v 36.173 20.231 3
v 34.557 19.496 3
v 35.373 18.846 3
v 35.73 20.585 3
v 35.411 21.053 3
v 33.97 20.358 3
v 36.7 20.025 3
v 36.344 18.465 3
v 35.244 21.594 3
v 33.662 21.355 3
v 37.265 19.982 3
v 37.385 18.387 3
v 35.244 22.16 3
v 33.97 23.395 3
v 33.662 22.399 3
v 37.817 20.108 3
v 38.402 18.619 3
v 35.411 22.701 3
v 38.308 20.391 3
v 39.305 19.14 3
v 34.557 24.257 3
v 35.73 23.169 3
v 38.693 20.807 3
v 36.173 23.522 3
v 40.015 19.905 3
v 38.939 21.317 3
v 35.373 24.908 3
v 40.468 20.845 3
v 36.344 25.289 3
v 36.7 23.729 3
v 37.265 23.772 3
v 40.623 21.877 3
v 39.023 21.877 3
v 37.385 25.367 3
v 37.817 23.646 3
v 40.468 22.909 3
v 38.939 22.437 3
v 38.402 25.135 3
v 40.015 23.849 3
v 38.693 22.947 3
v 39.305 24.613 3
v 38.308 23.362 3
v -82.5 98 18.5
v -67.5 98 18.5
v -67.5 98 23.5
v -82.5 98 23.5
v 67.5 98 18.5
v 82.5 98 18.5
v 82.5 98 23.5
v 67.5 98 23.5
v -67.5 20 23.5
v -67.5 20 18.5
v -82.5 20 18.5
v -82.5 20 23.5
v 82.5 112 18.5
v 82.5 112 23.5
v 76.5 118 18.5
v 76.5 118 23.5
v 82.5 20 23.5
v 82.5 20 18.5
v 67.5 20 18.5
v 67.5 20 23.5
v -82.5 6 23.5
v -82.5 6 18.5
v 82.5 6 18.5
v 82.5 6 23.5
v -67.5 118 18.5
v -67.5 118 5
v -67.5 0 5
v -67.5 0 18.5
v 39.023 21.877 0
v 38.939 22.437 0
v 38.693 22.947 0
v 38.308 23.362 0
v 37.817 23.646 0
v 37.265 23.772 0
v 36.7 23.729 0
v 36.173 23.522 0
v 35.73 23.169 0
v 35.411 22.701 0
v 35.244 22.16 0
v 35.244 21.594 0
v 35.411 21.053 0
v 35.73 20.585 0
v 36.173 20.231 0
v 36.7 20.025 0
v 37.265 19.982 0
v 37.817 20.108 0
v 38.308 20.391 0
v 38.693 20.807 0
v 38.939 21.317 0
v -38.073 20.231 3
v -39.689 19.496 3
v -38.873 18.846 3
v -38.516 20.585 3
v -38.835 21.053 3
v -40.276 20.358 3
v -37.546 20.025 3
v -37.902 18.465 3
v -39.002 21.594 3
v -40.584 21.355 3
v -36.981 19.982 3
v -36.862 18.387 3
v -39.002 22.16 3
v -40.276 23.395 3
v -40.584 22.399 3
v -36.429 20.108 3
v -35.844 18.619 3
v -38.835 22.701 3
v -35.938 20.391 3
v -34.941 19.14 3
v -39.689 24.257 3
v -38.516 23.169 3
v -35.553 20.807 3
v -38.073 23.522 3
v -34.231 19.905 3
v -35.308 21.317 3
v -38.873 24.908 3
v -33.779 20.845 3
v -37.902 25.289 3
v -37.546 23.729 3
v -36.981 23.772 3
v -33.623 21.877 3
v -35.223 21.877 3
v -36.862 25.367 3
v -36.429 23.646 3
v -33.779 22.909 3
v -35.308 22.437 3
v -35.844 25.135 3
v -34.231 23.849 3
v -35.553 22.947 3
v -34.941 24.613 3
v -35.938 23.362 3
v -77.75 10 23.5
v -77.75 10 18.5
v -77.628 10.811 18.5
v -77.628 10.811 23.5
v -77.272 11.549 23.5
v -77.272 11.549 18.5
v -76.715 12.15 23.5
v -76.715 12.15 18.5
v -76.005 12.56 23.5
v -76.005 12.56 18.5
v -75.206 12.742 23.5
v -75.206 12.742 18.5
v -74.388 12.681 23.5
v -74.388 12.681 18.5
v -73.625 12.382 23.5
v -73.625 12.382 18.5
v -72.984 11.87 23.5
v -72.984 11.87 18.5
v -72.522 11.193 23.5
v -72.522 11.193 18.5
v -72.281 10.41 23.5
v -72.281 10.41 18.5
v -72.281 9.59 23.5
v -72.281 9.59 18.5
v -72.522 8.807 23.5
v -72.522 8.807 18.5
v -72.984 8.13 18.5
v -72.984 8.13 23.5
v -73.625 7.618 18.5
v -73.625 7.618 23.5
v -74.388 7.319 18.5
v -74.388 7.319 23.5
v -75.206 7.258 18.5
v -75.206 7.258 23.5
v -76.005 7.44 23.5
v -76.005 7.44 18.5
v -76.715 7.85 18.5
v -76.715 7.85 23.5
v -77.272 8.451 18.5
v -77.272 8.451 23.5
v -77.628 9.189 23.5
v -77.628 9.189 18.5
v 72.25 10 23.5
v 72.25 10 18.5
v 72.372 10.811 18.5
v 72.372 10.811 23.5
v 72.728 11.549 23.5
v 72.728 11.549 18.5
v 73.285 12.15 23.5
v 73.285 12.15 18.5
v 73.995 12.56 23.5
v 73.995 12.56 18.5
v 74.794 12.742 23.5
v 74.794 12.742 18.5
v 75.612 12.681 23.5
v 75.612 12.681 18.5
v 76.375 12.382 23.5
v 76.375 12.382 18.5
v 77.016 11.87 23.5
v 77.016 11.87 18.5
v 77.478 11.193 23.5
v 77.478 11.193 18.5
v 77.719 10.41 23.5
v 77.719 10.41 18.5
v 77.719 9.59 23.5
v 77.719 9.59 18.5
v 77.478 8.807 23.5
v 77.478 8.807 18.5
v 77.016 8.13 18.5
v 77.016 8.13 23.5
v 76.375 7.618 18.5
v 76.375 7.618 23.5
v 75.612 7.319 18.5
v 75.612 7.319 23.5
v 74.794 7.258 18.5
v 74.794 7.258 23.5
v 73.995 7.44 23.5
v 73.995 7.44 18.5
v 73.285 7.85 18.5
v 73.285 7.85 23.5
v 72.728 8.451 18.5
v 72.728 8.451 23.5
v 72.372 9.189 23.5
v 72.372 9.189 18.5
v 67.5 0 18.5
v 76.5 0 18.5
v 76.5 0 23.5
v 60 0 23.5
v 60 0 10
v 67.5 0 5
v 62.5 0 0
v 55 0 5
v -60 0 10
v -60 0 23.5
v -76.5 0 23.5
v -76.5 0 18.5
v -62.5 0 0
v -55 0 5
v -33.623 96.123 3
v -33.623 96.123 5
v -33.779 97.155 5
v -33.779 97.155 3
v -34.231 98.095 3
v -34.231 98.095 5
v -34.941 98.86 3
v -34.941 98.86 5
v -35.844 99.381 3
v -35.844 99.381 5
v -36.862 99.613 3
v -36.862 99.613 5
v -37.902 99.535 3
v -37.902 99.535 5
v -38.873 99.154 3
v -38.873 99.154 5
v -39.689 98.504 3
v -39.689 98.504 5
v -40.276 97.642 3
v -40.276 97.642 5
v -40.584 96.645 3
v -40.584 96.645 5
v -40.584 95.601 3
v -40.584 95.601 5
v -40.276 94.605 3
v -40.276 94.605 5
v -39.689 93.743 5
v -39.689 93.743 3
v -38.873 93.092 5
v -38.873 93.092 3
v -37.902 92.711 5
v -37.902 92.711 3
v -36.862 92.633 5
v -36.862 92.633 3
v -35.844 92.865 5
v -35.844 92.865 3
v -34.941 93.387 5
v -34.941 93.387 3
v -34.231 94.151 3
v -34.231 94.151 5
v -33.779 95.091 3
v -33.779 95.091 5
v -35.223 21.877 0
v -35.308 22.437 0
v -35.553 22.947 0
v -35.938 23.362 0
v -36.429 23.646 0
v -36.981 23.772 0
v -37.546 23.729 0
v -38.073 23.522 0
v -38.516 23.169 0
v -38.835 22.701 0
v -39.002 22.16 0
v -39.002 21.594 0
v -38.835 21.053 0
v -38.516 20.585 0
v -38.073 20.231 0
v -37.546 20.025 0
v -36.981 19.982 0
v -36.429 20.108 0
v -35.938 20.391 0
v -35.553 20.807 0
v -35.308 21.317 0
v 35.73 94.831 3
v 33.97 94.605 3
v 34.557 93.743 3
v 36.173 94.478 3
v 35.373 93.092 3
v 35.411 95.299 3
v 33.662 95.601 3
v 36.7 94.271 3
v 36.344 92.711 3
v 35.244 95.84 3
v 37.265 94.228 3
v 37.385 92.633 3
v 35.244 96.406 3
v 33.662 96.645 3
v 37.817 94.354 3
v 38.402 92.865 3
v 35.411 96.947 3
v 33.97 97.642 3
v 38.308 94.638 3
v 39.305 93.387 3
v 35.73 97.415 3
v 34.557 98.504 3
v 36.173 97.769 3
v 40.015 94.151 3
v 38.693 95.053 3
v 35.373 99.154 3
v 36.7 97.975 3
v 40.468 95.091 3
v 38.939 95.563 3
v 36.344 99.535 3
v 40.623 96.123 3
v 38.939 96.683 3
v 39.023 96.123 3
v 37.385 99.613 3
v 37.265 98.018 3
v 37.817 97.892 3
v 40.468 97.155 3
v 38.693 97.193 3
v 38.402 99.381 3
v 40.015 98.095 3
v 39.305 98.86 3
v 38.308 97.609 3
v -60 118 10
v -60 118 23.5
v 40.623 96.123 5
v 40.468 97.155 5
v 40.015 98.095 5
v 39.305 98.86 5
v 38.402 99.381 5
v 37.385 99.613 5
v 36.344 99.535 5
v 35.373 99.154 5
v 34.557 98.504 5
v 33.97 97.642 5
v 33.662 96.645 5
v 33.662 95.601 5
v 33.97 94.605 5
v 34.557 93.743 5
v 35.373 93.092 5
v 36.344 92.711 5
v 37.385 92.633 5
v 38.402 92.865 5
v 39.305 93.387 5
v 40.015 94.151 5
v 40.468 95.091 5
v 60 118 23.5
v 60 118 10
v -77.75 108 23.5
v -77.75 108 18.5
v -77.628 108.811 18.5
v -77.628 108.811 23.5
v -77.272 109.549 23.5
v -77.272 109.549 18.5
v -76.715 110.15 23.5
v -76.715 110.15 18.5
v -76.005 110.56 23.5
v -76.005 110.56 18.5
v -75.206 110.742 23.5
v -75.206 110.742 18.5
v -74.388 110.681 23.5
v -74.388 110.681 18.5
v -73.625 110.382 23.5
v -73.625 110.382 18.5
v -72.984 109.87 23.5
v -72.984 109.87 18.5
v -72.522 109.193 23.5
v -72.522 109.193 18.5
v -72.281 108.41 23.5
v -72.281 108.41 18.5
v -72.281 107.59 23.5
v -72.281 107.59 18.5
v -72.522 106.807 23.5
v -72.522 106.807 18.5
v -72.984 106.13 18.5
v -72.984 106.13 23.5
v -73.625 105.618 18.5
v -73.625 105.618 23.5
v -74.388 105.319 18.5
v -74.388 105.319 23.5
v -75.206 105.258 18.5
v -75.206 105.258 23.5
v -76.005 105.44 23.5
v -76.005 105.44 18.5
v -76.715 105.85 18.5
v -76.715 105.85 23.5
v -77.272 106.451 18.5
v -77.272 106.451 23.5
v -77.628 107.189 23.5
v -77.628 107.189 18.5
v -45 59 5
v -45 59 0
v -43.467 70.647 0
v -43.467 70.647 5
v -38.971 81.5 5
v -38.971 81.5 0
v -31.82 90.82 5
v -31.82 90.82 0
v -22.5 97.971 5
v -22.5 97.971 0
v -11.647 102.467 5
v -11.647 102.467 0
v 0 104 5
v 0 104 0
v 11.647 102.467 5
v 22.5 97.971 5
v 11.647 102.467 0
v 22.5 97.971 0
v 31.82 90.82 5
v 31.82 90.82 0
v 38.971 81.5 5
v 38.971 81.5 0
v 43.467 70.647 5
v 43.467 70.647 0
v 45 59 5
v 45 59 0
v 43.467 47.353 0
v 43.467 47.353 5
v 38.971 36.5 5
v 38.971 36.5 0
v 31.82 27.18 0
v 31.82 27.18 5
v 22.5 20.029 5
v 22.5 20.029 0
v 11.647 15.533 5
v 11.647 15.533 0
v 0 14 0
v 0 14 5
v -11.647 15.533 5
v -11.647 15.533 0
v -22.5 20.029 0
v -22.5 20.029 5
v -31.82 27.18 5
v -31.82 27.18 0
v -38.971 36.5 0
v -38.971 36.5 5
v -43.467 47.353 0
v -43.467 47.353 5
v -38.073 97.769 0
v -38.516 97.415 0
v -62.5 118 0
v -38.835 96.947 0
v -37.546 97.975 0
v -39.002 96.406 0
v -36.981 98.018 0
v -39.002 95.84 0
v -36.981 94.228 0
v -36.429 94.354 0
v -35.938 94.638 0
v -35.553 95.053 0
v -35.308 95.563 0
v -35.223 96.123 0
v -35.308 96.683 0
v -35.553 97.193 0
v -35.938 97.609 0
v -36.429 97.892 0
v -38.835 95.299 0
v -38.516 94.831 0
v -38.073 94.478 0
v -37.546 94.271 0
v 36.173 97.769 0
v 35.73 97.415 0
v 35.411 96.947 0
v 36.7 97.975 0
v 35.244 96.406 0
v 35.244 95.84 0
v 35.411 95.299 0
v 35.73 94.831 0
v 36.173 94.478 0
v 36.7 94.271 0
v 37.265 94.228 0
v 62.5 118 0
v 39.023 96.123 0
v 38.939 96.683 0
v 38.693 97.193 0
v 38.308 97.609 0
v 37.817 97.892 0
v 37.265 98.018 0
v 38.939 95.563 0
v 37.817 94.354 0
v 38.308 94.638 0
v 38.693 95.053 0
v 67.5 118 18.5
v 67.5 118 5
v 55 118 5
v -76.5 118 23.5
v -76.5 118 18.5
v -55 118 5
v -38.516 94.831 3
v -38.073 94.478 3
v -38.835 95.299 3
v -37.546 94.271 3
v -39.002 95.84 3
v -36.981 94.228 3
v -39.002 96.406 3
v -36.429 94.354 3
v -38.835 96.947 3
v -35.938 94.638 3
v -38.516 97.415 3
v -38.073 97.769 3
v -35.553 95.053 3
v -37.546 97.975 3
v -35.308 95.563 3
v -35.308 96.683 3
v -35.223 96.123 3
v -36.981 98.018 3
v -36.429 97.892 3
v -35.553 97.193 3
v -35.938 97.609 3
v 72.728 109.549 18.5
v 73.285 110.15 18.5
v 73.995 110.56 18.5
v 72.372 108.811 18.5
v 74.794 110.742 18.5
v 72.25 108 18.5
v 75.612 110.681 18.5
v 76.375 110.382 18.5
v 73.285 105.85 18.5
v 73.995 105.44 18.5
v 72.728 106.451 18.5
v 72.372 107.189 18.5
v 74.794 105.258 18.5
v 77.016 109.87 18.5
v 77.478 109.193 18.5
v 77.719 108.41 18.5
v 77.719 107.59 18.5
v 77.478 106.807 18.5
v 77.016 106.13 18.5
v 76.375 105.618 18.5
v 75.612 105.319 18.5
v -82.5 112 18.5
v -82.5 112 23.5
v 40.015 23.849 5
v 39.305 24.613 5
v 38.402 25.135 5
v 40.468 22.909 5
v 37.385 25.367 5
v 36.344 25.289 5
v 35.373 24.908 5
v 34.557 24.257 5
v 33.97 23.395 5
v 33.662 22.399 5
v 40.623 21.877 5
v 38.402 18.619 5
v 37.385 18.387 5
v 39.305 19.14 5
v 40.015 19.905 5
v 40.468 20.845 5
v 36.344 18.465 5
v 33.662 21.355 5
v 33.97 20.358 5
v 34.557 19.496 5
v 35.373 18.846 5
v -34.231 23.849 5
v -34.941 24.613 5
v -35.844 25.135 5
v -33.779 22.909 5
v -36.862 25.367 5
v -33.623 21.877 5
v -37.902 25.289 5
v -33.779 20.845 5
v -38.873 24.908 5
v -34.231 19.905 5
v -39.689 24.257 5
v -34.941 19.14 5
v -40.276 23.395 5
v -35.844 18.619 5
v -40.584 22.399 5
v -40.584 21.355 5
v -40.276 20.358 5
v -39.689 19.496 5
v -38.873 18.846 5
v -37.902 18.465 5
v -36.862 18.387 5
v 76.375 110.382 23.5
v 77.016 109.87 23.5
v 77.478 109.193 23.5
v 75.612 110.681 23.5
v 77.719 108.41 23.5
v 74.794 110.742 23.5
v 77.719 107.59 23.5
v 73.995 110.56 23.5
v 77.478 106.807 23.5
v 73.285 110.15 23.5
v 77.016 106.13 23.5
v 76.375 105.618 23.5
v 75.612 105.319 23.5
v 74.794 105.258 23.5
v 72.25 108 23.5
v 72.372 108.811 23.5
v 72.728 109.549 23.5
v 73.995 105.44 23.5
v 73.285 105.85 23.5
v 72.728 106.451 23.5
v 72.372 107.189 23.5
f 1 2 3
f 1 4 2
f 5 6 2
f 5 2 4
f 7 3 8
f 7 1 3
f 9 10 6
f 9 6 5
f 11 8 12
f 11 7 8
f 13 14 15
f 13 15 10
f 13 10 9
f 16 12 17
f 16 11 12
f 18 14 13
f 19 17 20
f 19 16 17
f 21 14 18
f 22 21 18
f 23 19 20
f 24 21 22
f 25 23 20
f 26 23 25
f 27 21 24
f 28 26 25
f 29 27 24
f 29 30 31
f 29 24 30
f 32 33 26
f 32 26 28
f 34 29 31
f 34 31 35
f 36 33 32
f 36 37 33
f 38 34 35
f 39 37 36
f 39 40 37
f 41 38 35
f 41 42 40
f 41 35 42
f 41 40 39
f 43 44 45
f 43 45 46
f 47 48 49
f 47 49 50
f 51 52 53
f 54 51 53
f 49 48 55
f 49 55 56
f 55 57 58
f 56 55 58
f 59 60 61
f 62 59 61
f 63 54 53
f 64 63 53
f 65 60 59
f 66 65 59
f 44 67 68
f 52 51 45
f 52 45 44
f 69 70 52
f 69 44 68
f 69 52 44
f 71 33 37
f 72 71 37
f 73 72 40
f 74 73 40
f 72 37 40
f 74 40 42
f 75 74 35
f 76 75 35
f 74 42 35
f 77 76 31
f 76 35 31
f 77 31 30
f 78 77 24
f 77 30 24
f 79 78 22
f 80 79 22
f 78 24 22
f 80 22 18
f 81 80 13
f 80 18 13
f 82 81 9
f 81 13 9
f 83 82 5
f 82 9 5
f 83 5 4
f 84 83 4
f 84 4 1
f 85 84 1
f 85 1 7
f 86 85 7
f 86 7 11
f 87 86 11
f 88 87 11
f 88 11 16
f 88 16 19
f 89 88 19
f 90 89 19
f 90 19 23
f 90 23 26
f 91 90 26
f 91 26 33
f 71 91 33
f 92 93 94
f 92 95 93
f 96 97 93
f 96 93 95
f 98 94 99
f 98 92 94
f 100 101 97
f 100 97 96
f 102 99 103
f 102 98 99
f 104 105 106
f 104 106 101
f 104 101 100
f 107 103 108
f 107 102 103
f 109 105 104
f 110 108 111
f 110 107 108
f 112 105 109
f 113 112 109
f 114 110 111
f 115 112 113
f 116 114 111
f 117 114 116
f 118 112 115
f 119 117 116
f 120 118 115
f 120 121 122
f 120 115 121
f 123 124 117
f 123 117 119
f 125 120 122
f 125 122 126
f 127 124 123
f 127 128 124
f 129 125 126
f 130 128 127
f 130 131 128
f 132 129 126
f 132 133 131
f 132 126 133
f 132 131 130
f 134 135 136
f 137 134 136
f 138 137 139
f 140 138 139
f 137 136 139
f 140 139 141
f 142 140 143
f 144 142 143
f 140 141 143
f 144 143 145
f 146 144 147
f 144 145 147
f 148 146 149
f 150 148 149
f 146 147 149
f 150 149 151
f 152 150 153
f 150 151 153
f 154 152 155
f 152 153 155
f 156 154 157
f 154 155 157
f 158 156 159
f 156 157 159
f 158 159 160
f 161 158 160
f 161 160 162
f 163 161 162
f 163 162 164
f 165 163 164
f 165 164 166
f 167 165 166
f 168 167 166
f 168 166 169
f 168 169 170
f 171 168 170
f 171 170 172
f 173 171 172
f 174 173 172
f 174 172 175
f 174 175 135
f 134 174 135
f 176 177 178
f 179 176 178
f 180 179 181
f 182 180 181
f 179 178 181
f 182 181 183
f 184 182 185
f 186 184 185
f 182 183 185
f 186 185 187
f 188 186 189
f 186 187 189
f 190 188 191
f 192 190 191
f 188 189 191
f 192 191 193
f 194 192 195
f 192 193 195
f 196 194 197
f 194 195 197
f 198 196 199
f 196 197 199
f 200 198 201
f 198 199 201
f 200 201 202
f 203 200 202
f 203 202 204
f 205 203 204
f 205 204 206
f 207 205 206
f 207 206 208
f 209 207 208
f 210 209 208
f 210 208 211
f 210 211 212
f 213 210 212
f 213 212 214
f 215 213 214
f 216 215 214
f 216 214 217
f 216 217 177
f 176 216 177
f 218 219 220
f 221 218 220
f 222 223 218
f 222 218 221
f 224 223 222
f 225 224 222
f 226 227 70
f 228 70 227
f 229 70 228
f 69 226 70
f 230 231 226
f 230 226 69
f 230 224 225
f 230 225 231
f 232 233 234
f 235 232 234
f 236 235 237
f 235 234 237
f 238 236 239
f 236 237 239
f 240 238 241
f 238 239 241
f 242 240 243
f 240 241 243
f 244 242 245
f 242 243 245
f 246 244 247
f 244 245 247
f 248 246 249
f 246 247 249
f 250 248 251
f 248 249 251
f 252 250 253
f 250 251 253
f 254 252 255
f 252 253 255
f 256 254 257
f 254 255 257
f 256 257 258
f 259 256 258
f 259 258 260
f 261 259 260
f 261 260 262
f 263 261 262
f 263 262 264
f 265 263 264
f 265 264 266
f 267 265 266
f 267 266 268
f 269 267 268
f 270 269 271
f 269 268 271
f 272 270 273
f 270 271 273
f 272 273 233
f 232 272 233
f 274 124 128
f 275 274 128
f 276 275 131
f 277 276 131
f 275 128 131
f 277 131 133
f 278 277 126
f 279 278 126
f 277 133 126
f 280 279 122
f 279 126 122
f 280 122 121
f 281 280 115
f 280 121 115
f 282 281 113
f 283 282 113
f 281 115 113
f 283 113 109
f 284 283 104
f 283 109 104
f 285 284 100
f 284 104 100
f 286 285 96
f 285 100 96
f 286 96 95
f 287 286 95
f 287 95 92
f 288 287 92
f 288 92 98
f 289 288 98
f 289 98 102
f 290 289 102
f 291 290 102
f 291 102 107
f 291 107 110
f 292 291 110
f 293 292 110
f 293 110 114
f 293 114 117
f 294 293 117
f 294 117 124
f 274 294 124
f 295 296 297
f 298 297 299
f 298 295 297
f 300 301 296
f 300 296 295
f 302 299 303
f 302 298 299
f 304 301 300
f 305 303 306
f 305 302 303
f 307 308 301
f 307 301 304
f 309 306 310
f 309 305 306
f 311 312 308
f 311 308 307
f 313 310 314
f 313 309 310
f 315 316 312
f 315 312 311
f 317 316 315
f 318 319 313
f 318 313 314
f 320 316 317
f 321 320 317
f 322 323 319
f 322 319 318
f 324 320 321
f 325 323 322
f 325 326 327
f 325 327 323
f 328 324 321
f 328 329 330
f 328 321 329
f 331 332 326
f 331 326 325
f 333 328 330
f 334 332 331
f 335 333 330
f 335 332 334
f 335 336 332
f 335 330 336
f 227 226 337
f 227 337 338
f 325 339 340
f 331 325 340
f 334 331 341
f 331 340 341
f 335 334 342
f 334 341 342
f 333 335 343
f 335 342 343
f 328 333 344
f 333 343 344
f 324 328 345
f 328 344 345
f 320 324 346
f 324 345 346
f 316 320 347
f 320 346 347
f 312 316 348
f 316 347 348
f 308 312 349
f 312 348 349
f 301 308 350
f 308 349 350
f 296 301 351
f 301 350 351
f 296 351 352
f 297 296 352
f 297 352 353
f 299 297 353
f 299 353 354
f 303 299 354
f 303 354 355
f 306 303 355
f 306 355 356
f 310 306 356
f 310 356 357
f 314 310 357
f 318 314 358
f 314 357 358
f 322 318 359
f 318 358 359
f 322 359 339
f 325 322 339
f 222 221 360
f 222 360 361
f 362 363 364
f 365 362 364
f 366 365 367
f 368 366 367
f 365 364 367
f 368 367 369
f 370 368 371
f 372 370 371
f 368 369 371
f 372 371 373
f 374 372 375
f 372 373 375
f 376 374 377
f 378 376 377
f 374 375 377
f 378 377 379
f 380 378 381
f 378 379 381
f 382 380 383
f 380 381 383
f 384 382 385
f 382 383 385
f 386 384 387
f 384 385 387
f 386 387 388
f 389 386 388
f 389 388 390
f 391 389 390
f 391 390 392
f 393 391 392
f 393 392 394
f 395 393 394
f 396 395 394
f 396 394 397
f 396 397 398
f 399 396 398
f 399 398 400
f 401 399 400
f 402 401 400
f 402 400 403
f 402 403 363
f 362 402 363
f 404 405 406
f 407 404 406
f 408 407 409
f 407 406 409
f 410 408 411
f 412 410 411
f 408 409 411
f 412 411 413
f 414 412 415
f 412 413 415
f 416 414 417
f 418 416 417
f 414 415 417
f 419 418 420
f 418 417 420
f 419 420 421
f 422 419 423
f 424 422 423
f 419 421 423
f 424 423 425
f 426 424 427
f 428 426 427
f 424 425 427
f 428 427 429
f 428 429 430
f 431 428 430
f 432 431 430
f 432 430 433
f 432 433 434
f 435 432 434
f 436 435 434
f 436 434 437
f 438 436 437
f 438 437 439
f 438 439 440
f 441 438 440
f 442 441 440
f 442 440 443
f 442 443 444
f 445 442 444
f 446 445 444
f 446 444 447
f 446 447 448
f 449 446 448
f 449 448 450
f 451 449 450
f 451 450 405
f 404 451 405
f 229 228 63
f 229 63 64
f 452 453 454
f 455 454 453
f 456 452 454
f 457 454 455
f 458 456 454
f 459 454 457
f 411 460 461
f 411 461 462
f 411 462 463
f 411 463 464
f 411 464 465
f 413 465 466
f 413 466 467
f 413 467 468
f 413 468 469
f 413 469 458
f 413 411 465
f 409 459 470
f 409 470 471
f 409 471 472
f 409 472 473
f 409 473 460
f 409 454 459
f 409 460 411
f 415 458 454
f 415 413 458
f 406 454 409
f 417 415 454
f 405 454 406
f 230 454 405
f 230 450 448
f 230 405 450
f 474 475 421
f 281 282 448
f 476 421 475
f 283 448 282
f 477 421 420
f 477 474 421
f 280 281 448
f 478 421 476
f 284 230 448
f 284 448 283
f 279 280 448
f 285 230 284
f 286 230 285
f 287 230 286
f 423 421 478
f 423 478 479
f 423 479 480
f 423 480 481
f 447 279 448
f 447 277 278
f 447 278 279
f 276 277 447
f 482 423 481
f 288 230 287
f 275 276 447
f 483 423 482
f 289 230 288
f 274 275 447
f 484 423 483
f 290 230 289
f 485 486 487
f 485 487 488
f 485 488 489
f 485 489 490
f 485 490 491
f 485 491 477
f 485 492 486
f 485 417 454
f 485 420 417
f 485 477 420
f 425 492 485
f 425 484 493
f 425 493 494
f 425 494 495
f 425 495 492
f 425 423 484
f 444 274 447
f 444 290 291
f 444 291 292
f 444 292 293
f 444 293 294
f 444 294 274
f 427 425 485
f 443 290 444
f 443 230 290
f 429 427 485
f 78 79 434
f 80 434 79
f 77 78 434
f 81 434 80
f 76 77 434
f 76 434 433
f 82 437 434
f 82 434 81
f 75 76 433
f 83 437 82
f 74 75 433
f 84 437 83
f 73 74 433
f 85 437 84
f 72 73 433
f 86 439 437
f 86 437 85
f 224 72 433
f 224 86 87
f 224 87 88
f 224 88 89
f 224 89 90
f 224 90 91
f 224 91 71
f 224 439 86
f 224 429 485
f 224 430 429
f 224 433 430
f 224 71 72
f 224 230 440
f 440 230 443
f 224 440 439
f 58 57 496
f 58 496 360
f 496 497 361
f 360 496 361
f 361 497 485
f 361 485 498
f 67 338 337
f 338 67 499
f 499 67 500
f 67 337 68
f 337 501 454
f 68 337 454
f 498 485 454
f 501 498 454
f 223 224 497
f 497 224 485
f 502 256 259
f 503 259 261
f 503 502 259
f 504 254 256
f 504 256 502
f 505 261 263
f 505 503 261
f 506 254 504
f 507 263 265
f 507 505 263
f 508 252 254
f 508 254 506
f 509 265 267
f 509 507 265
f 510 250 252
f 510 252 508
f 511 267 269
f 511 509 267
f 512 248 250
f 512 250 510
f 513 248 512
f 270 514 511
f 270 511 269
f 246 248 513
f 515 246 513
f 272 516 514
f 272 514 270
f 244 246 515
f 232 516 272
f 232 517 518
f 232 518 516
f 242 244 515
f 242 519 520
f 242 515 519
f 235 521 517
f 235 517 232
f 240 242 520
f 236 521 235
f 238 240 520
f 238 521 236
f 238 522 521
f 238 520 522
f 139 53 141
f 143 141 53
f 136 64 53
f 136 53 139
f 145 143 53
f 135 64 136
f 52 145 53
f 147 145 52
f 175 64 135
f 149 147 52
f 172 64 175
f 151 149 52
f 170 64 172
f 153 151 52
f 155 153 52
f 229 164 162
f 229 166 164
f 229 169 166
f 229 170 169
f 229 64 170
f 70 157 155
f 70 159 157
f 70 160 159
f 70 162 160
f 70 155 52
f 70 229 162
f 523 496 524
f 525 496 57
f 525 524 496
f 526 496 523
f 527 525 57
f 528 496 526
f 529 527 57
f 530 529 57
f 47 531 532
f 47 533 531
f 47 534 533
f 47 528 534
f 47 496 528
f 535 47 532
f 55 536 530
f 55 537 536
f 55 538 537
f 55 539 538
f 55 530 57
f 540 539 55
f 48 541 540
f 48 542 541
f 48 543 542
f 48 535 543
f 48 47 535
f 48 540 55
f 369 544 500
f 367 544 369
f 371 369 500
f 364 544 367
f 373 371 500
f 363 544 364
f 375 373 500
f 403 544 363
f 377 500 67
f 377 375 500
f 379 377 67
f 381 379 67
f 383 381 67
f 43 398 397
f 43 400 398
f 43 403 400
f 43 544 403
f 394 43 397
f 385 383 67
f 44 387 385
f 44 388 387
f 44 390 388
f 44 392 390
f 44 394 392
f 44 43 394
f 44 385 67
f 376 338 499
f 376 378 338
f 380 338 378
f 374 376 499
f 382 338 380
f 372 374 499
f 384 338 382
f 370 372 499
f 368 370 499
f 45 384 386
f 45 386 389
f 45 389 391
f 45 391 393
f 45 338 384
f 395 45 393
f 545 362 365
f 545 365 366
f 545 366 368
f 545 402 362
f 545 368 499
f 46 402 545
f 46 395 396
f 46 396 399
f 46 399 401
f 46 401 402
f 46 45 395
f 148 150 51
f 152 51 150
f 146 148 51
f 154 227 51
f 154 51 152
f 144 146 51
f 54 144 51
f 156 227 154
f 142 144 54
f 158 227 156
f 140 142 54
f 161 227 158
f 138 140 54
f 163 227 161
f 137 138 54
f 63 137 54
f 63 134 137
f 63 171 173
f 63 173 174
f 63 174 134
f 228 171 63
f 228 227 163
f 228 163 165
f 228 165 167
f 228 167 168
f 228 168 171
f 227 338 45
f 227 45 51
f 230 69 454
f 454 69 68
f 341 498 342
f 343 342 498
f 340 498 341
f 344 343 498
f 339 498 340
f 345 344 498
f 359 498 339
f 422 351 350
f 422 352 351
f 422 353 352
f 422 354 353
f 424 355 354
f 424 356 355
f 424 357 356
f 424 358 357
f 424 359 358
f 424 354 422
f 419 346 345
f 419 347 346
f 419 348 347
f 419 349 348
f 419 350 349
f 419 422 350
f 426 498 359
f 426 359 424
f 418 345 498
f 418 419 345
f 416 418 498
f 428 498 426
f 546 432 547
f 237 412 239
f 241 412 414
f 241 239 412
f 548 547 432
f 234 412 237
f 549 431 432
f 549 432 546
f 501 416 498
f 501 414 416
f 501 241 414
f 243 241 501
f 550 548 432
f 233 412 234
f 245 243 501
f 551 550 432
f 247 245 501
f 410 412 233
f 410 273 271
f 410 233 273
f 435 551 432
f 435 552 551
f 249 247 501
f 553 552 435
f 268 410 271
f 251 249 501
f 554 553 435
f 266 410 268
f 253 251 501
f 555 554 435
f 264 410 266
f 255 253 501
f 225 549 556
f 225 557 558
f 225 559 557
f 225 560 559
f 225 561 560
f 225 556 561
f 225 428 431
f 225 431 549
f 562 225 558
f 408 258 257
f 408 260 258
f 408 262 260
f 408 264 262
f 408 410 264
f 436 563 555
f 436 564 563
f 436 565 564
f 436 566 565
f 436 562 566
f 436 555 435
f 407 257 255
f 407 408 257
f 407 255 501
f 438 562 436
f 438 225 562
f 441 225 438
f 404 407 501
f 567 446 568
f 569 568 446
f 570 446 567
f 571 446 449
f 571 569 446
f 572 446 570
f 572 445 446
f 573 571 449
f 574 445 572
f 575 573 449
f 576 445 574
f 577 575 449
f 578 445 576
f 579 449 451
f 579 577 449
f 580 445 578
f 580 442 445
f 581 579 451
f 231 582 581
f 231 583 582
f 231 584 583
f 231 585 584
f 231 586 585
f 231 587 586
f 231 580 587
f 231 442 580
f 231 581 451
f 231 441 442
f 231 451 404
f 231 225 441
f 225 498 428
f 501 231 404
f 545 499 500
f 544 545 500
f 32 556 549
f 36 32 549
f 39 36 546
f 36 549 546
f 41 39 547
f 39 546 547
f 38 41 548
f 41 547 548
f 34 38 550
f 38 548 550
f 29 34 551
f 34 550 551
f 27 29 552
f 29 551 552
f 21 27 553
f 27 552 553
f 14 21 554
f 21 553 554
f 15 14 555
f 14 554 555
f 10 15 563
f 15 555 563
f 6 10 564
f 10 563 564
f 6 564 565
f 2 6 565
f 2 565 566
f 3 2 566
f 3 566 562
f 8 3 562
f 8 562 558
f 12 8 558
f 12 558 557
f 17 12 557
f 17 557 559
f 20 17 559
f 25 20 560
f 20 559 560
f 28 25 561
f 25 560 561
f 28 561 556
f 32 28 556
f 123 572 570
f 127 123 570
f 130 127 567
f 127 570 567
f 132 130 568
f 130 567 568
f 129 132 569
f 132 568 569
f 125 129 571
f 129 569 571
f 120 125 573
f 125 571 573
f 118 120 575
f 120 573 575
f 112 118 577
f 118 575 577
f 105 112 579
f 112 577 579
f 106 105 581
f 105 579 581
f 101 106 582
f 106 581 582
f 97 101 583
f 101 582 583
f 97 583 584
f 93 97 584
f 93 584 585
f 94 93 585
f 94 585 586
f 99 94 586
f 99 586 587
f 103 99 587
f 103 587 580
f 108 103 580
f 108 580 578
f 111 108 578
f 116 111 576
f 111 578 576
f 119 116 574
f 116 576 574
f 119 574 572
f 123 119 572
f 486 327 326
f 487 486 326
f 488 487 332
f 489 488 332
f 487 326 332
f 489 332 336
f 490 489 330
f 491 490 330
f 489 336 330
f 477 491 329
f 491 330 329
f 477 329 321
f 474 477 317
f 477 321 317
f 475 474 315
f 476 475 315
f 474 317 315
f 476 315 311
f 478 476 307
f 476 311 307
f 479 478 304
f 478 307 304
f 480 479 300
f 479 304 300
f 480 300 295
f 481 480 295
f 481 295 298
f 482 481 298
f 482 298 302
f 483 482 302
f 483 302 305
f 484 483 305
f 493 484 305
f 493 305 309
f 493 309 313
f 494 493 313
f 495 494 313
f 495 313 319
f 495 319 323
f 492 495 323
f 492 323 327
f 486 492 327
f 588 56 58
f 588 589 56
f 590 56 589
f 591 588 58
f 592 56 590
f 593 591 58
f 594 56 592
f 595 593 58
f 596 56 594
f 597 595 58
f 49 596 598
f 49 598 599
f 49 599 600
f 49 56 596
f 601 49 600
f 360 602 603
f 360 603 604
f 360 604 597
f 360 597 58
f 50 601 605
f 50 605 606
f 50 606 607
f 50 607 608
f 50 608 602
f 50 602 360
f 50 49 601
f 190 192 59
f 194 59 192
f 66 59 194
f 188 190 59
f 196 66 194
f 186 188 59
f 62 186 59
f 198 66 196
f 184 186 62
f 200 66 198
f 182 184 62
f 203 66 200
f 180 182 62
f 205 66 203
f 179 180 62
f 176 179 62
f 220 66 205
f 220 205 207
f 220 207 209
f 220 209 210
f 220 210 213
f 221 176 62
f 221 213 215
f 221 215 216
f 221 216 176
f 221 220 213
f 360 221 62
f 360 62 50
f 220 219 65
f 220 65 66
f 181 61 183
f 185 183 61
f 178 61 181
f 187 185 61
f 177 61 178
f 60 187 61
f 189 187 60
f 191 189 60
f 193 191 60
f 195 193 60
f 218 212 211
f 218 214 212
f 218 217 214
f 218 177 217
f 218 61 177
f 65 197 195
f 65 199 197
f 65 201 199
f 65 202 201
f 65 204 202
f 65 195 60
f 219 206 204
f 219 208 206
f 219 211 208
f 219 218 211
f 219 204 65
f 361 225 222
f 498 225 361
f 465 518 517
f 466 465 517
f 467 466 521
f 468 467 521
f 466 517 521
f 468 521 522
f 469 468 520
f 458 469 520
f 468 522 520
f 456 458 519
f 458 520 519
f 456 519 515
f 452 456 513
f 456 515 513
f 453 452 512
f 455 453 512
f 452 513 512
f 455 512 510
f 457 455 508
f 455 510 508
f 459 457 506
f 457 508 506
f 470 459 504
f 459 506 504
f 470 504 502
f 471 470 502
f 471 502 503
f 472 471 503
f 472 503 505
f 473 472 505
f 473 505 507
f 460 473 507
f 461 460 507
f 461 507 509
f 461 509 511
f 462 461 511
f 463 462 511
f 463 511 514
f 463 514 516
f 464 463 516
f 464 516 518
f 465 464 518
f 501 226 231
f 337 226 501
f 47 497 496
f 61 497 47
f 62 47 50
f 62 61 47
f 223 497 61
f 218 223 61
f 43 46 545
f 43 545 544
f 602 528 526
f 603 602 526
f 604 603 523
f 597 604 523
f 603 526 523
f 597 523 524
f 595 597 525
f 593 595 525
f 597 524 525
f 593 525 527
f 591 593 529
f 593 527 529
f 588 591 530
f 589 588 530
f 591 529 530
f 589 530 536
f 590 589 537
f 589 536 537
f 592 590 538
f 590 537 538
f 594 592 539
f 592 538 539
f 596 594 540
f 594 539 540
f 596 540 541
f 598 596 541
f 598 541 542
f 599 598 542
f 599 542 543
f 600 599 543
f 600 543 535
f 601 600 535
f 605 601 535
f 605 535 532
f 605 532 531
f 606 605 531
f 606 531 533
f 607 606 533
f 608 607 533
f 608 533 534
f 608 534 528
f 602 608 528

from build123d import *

# Parameters (mm, degrees)
EXTRUDE_5_DEPTH     = 118
SKETCH_8_R          = 45
CUT_EXTRUDE_2_DEPTH = 130
CHAMFER_1_SIZE      = 6
SKETCH_9_W          = 30
SKETCH_9_H          = 78
CUT_EXTRUDE_3_DEPTH = 130
CHAMFER_2_SIZE      = 5
CHAMFER_3_SIZE      = 5
SKETCH_10_R         = 2.75
CUT_EXTRUDE_4_DEPTH = 146.163700697
SKETCH_14_R         = 1.9
CUT_EXTRUDE_5_DEPTH = 146.163700697
SKETCH_15_R         = 3.5
CUT_EXTRUDE_6_DEPTH = 2


with BuildPart() as part:
    # 草图7 → 凸台-拉伸5 (new body)
    with BuildSketch(Plane(origin=(0, 0, 0), x_dir=(1, 0, 0), z_dir=(0, 1, 0))):
        Polygon((-67.5, 0), (67.5, 0), (67.5, -18.5), (82.5, -18.5), (82.5, -23.5), (60, -23.5), (60, -5), (-60, -5), (-60, -23.5), (-82.5, -23.5), (-82.5, -18.5), (-67.5, -18.5), align=None)
    extrude(amount=EXTRUDE_5_DEPTH)

    # 草图8 → 切除-拉伸2 (cut)
    with BuildSketch(Plane(origin=(0, 0, 0), x_dir=(-1, 0, 0), z_dir=(0, 0, -1))):
        with Locations((0, 59)):
            Circle(SKETCH_8_R)
    extrude(amount=-CUT_EXTRUDE_2_DEPTH, mode=Mode.SUBTRACT)

    # 倒角1
    chamfer_1_edges = [part.edges().sort_by_distance(p)[0] for p in [
        (82.5, 0, 21),
        (-82.5, 0, 21),
        (-82.5, 118, 21),
        (82.5, 118, 21),
    ]]
    chamfer(chamfer_1_edges, length=CHAMFER_1_SIZE)

    # 草图9 → 切除-拉伸3 (cut)
    with BuildSketch(Plane(origin=(0, 0, 18.5), x_dir=(-1, 0, 0), z_dir=(0, 0, -1))):
        with Locations((-82.5, 59)):
            Rectangle(SKETCH_9_W, SKETCH_9_H)
        with Locations((82.5, 59)):
            Rectangle(SKETCH_9_W, SKETCH_9_H)
    extrude(amount=-CUT_EXTRUDE_3_DEPTH, mode=Mode.SUBTRACT)

    # 倒角2
    chamfer_2_edges = [part.edges().sort_by_distance(p)[0] for p in [
        (-67.5, 59, 0),
        (67.5, 59, 0),
    ]]
    chamfer(chamfer_2_edges, length=CHAMFER_2_SIZE)

    # 倒角3
    chamfer_3_edges = [part.edges().sort_by_distance(p)[0] for p in [
        (60, 59, 5),
        (-60, 59, 5),
    ]]
    chamfer(chamfer_3_edges, length=CHAMFER_3_SIZE)

    # 草图10 → 切除-拉伸4 (cut, through all)
    with BuildSketch(Plane(origin=(0, 0, 18.5), x_dir=(-1, 0, 0), z_dir=(0, 0, -1))):
        with Locations((75, 10)):
            Circle(SKETCH_10_R)
        with Locations((-75, 10)):
            Circle(SKETCH_10_R)
        with Locations((-75, 108)):
            Circle(SKETCH_10_R)
        with Locations((75, 108)):
            Circle(SKETCH_10_R)
    extrude(amount=-CUT_EXTRUDE_4_DEPTH, mode=Mode.SUBTRACT)

    # 草图14 → 切除-拉伸5 (cut, through all)
    with BuildSketch(Plane.XY.offset(5)):
        with Locations((-37.123106012, 96.123106012)):
            Circle(SKETCH_14_R)
        with Locations((-37.123106012, 21.876893988)):
            Circle(SKETCH_14_R)
        with Locations((37.123106012, 21.876893988)):
            Circle(SKETCH_14_R)
        with Locations((37.123106012, 96.123106012)):
            Circle(SKETCH_14_R)
    extrude(amount=-CUT_EXTRUDE_5_DEPTH, mode=Mode.SUBTRACT)

    # 草图15 → 切除-拉伸6 (cut)
    with BuildSketch(Plane.XY.offset(5)):
        with Locations((-37.123106012, 96.123106012)):
            Circle(SKETCH_15_R)
        with Locations((37.123106012, 96.123106012)):
            Circle(SKETCH_15_R)
        with Locations((37.123106012, 21.876893988)):
            Circle(SKETCH_15_R)
        with Locations((-37.123106012, 21.876893988)):
            Circle(SKETCH_15_R)
    extrude(amount=-CUT_EXTRUDE_6_DEPTH, mode=Mode.SUBTRACT)


solid = part.part
